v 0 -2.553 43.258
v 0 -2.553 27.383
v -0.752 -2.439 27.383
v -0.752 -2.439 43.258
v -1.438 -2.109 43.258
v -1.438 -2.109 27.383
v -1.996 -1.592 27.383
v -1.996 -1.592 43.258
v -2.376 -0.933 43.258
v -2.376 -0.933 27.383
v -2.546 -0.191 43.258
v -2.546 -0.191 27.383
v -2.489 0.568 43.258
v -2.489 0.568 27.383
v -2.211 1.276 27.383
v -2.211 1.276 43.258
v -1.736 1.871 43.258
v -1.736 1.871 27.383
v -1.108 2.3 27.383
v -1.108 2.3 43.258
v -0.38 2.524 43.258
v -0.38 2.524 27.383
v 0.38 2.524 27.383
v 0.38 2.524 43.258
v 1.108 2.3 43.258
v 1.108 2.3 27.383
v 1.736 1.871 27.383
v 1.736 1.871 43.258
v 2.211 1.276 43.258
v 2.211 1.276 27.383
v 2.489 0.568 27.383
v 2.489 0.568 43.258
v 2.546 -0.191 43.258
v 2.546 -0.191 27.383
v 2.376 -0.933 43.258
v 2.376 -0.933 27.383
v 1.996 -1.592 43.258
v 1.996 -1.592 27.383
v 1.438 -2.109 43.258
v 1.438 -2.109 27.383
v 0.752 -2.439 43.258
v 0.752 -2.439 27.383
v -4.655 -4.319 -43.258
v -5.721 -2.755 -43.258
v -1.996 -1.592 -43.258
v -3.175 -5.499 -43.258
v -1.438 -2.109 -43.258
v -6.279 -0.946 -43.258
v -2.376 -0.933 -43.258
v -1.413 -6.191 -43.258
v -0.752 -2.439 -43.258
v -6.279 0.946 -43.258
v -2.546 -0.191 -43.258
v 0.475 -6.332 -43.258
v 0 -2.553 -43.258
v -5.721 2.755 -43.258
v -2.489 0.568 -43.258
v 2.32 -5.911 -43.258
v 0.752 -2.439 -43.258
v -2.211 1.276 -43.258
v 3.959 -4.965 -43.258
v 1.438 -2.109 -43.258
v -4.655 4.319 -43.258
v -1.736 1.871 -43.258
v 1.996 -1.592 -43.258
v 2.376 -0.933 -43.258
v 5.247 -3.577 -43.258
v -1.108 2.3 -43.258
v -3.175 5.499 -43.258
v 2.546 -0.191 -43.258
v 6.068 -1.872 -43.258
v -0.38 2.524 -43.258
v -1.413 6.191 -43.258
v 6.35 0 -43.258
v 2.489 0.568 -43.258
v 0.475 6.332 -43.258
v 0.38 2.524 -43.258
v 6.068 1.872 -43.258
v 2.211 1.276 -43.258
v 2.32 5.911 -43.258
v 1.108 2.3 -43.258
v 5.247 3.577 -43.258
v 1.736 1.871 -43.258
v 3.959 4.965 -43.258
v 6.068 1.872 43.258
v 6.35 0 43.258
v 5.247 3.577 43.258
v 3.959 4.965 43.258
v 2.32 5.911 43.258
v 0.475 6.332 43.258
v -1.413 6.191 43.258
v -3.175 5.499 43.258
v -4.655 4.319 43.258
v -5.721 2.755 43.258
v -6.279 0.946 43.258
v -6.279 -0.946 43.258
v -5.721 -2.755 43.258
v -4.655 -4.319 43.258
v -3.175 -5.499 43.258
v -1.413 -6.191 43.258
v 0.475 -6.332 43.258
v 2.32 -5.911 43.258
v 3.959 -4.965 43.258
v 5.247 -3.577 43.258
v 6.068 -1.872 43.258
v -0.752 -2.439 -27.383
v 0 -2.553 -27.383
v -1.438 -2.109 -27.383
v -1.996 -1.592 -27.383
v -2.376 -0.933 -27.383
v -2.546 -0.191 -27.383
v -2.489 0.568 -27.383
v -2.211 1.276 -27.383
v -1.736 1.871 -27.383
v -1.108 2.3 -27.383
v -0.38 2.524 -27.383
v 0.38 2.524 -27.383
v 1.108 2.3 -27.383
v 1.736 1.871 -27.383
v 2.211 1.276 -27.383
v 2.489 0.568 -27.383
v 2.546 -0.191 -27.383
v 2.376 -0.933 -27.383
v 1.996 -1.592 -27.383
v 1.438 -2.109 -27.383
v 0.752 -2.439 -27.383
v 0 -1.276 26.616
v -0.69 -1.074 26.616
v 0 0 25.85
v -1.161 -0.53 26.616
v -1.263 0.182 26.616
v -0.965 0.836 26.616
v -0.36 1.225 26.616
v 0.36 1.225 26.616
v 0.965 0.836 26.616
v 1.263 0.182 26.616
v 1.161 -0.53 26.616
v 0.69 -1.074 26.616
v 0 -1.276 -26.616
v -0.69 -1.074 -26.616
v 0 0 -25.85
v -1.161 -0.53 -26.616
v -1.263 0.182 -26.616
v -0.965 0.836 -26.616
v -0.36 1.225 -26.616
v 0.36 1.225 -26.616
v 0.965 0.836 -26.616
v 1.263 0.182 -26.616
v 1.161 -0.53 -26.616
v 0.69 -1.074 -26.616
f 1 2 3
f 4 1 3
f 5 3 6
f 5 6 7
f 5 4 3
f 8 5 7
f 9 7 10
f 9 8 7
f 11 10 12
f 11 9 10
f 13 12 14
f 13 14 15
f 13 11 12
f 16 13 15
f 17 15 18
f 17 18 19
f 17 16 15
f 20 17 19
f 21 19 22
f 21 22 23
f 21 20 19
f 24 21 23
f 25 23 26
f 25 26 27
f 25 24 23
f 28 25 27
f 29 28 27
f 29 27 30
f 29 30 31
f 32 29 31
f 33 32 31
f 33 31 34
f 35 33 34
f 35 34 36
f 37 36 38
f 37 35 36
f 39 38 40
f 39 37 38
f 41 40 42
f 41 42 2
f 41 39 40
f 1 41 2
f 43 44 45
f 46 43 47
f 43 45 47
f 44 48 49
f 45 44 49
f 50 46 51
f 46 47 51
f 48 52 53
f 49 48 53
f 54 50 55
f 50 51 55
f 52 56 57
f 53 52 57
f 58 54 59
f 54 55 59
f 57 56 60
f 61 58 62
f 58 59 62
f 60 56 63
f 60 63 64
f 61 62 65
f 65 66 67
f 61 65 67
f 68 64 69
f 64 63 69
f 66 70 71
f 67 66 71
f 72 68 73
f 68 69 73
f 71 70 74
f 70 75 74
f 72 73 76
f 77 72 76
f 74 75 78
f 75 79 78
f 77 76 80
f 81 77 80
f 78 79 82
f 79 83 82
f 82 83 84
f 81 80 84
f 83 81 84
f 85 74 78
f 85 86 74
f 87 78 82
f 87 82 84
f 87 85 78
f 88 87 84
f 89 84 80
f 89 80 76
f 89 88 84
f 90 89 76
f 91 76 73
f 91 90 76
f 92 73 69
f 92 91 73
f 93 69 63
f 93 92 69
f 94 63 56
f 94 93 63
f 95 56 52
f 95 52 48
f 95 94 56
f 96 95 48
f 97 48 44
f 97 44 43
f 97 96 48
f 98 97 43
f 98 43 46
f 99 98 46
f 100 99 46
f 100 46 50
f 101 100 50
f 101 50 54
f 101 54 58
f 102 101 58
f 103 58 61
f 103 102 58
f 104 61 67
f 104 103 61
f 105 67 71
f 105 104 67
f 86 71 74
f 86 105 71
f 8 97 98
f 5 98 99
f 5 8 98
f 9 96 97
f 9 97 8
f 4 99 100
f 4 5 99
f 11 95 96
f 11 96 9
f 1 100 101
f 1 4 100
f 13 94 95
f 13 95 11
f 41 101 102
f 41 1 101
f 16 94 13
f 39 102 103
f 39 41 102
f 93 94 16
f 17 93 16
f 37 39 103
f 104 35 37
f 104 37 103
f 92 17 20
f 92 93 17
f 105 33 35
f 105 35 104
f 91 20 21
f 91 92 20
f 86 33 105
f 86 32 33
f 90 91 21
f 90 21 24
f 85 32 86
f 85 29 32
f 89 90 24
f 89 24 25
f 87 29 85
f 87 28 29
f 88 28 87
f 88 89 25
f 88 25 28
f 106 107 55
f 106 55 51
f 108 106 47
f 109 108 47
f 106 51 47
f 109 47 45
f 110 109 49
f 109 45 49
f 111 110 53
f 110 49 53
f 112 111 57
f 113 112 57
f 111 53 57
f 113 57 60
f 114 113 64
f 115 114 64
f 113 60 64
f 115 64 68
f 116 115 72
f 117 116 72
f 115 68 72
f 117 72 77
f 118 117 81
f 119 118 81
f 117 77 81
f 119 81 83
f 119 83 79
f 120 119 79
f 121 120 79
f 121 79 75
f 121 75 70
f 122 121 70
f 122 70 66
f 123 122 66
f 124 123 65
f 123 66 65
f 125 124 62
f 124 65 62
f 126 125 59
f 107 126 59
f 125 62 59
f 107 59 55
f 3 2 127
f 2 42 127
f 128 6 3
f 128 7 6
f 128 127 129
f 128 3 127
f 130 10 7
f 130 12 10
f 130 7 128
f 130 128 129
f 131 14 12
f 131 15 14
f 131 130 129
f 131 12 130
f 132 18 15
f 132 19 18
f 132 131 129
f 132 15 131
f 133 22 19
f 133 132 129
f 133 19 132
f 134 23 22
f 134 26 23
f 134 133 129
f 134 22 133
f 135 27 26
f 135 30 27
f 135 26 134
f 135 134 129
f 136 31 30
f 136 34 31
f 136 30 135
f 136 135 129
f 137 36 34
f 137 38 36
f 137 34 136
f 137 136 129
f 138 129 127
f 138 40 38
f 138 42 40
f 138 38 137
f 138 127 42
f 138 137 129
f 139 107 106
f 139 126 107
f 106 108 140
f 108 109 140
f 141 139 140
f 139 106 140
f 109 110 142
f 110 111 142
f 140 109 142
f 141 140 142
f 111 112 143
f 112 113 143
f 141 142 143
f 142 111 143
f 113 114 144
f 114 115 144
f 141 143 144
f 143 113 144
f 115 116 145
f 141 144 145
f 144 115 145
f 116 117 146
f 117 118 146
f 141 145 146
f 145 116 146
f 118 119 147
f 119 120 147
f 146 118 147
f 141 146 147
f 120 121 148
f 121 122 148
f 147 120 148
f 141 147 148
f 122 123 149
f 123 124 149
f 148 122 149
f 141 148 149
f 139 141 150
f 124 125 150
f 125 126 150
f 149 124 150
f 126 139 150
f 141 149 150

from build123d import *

# Parameters (mm, degrees)
SKETCH1_R           = 6.35
BOSS_EXTRUDE1_DEPTH = 43.258347316


with BuildPart() as part:
    # Sketch1 → Boss-Extrude1 (new, symmetric)
    with BuildSketch(Plane.XY):
        Circle(SKETCH1_R)
    extrude(amount=BOSS_EXTRUDE1_DEPTH, both=True)

    # Sketch3 → Tap Drill for 1/4-20 Tap1 (revolve, cut)
    with BuildSketch(Plane(origin=(0, 0, 43.258347316), x_dir=(0, -1, 0), z_dir=(1, 0, 0))):
        Polygon((0, 0), (0, 17.408816902), (2.5527, 15.875), (2.5527, 0), align=None)
    tap_drill_for_1_4_20_tap1 = revolve(axis=Axis((0, 0, 49.608347316), (0, 0, -1)), mode=Mode.SUBTRACT)

    # Mirror1: Tap Drill for 1/4-20 Tap1 across plane
    add(tap_drill_for_1_4_20_tap1.mirror(Plane.XY), mode=Mode.SUBTRACT)


solid = part.part
